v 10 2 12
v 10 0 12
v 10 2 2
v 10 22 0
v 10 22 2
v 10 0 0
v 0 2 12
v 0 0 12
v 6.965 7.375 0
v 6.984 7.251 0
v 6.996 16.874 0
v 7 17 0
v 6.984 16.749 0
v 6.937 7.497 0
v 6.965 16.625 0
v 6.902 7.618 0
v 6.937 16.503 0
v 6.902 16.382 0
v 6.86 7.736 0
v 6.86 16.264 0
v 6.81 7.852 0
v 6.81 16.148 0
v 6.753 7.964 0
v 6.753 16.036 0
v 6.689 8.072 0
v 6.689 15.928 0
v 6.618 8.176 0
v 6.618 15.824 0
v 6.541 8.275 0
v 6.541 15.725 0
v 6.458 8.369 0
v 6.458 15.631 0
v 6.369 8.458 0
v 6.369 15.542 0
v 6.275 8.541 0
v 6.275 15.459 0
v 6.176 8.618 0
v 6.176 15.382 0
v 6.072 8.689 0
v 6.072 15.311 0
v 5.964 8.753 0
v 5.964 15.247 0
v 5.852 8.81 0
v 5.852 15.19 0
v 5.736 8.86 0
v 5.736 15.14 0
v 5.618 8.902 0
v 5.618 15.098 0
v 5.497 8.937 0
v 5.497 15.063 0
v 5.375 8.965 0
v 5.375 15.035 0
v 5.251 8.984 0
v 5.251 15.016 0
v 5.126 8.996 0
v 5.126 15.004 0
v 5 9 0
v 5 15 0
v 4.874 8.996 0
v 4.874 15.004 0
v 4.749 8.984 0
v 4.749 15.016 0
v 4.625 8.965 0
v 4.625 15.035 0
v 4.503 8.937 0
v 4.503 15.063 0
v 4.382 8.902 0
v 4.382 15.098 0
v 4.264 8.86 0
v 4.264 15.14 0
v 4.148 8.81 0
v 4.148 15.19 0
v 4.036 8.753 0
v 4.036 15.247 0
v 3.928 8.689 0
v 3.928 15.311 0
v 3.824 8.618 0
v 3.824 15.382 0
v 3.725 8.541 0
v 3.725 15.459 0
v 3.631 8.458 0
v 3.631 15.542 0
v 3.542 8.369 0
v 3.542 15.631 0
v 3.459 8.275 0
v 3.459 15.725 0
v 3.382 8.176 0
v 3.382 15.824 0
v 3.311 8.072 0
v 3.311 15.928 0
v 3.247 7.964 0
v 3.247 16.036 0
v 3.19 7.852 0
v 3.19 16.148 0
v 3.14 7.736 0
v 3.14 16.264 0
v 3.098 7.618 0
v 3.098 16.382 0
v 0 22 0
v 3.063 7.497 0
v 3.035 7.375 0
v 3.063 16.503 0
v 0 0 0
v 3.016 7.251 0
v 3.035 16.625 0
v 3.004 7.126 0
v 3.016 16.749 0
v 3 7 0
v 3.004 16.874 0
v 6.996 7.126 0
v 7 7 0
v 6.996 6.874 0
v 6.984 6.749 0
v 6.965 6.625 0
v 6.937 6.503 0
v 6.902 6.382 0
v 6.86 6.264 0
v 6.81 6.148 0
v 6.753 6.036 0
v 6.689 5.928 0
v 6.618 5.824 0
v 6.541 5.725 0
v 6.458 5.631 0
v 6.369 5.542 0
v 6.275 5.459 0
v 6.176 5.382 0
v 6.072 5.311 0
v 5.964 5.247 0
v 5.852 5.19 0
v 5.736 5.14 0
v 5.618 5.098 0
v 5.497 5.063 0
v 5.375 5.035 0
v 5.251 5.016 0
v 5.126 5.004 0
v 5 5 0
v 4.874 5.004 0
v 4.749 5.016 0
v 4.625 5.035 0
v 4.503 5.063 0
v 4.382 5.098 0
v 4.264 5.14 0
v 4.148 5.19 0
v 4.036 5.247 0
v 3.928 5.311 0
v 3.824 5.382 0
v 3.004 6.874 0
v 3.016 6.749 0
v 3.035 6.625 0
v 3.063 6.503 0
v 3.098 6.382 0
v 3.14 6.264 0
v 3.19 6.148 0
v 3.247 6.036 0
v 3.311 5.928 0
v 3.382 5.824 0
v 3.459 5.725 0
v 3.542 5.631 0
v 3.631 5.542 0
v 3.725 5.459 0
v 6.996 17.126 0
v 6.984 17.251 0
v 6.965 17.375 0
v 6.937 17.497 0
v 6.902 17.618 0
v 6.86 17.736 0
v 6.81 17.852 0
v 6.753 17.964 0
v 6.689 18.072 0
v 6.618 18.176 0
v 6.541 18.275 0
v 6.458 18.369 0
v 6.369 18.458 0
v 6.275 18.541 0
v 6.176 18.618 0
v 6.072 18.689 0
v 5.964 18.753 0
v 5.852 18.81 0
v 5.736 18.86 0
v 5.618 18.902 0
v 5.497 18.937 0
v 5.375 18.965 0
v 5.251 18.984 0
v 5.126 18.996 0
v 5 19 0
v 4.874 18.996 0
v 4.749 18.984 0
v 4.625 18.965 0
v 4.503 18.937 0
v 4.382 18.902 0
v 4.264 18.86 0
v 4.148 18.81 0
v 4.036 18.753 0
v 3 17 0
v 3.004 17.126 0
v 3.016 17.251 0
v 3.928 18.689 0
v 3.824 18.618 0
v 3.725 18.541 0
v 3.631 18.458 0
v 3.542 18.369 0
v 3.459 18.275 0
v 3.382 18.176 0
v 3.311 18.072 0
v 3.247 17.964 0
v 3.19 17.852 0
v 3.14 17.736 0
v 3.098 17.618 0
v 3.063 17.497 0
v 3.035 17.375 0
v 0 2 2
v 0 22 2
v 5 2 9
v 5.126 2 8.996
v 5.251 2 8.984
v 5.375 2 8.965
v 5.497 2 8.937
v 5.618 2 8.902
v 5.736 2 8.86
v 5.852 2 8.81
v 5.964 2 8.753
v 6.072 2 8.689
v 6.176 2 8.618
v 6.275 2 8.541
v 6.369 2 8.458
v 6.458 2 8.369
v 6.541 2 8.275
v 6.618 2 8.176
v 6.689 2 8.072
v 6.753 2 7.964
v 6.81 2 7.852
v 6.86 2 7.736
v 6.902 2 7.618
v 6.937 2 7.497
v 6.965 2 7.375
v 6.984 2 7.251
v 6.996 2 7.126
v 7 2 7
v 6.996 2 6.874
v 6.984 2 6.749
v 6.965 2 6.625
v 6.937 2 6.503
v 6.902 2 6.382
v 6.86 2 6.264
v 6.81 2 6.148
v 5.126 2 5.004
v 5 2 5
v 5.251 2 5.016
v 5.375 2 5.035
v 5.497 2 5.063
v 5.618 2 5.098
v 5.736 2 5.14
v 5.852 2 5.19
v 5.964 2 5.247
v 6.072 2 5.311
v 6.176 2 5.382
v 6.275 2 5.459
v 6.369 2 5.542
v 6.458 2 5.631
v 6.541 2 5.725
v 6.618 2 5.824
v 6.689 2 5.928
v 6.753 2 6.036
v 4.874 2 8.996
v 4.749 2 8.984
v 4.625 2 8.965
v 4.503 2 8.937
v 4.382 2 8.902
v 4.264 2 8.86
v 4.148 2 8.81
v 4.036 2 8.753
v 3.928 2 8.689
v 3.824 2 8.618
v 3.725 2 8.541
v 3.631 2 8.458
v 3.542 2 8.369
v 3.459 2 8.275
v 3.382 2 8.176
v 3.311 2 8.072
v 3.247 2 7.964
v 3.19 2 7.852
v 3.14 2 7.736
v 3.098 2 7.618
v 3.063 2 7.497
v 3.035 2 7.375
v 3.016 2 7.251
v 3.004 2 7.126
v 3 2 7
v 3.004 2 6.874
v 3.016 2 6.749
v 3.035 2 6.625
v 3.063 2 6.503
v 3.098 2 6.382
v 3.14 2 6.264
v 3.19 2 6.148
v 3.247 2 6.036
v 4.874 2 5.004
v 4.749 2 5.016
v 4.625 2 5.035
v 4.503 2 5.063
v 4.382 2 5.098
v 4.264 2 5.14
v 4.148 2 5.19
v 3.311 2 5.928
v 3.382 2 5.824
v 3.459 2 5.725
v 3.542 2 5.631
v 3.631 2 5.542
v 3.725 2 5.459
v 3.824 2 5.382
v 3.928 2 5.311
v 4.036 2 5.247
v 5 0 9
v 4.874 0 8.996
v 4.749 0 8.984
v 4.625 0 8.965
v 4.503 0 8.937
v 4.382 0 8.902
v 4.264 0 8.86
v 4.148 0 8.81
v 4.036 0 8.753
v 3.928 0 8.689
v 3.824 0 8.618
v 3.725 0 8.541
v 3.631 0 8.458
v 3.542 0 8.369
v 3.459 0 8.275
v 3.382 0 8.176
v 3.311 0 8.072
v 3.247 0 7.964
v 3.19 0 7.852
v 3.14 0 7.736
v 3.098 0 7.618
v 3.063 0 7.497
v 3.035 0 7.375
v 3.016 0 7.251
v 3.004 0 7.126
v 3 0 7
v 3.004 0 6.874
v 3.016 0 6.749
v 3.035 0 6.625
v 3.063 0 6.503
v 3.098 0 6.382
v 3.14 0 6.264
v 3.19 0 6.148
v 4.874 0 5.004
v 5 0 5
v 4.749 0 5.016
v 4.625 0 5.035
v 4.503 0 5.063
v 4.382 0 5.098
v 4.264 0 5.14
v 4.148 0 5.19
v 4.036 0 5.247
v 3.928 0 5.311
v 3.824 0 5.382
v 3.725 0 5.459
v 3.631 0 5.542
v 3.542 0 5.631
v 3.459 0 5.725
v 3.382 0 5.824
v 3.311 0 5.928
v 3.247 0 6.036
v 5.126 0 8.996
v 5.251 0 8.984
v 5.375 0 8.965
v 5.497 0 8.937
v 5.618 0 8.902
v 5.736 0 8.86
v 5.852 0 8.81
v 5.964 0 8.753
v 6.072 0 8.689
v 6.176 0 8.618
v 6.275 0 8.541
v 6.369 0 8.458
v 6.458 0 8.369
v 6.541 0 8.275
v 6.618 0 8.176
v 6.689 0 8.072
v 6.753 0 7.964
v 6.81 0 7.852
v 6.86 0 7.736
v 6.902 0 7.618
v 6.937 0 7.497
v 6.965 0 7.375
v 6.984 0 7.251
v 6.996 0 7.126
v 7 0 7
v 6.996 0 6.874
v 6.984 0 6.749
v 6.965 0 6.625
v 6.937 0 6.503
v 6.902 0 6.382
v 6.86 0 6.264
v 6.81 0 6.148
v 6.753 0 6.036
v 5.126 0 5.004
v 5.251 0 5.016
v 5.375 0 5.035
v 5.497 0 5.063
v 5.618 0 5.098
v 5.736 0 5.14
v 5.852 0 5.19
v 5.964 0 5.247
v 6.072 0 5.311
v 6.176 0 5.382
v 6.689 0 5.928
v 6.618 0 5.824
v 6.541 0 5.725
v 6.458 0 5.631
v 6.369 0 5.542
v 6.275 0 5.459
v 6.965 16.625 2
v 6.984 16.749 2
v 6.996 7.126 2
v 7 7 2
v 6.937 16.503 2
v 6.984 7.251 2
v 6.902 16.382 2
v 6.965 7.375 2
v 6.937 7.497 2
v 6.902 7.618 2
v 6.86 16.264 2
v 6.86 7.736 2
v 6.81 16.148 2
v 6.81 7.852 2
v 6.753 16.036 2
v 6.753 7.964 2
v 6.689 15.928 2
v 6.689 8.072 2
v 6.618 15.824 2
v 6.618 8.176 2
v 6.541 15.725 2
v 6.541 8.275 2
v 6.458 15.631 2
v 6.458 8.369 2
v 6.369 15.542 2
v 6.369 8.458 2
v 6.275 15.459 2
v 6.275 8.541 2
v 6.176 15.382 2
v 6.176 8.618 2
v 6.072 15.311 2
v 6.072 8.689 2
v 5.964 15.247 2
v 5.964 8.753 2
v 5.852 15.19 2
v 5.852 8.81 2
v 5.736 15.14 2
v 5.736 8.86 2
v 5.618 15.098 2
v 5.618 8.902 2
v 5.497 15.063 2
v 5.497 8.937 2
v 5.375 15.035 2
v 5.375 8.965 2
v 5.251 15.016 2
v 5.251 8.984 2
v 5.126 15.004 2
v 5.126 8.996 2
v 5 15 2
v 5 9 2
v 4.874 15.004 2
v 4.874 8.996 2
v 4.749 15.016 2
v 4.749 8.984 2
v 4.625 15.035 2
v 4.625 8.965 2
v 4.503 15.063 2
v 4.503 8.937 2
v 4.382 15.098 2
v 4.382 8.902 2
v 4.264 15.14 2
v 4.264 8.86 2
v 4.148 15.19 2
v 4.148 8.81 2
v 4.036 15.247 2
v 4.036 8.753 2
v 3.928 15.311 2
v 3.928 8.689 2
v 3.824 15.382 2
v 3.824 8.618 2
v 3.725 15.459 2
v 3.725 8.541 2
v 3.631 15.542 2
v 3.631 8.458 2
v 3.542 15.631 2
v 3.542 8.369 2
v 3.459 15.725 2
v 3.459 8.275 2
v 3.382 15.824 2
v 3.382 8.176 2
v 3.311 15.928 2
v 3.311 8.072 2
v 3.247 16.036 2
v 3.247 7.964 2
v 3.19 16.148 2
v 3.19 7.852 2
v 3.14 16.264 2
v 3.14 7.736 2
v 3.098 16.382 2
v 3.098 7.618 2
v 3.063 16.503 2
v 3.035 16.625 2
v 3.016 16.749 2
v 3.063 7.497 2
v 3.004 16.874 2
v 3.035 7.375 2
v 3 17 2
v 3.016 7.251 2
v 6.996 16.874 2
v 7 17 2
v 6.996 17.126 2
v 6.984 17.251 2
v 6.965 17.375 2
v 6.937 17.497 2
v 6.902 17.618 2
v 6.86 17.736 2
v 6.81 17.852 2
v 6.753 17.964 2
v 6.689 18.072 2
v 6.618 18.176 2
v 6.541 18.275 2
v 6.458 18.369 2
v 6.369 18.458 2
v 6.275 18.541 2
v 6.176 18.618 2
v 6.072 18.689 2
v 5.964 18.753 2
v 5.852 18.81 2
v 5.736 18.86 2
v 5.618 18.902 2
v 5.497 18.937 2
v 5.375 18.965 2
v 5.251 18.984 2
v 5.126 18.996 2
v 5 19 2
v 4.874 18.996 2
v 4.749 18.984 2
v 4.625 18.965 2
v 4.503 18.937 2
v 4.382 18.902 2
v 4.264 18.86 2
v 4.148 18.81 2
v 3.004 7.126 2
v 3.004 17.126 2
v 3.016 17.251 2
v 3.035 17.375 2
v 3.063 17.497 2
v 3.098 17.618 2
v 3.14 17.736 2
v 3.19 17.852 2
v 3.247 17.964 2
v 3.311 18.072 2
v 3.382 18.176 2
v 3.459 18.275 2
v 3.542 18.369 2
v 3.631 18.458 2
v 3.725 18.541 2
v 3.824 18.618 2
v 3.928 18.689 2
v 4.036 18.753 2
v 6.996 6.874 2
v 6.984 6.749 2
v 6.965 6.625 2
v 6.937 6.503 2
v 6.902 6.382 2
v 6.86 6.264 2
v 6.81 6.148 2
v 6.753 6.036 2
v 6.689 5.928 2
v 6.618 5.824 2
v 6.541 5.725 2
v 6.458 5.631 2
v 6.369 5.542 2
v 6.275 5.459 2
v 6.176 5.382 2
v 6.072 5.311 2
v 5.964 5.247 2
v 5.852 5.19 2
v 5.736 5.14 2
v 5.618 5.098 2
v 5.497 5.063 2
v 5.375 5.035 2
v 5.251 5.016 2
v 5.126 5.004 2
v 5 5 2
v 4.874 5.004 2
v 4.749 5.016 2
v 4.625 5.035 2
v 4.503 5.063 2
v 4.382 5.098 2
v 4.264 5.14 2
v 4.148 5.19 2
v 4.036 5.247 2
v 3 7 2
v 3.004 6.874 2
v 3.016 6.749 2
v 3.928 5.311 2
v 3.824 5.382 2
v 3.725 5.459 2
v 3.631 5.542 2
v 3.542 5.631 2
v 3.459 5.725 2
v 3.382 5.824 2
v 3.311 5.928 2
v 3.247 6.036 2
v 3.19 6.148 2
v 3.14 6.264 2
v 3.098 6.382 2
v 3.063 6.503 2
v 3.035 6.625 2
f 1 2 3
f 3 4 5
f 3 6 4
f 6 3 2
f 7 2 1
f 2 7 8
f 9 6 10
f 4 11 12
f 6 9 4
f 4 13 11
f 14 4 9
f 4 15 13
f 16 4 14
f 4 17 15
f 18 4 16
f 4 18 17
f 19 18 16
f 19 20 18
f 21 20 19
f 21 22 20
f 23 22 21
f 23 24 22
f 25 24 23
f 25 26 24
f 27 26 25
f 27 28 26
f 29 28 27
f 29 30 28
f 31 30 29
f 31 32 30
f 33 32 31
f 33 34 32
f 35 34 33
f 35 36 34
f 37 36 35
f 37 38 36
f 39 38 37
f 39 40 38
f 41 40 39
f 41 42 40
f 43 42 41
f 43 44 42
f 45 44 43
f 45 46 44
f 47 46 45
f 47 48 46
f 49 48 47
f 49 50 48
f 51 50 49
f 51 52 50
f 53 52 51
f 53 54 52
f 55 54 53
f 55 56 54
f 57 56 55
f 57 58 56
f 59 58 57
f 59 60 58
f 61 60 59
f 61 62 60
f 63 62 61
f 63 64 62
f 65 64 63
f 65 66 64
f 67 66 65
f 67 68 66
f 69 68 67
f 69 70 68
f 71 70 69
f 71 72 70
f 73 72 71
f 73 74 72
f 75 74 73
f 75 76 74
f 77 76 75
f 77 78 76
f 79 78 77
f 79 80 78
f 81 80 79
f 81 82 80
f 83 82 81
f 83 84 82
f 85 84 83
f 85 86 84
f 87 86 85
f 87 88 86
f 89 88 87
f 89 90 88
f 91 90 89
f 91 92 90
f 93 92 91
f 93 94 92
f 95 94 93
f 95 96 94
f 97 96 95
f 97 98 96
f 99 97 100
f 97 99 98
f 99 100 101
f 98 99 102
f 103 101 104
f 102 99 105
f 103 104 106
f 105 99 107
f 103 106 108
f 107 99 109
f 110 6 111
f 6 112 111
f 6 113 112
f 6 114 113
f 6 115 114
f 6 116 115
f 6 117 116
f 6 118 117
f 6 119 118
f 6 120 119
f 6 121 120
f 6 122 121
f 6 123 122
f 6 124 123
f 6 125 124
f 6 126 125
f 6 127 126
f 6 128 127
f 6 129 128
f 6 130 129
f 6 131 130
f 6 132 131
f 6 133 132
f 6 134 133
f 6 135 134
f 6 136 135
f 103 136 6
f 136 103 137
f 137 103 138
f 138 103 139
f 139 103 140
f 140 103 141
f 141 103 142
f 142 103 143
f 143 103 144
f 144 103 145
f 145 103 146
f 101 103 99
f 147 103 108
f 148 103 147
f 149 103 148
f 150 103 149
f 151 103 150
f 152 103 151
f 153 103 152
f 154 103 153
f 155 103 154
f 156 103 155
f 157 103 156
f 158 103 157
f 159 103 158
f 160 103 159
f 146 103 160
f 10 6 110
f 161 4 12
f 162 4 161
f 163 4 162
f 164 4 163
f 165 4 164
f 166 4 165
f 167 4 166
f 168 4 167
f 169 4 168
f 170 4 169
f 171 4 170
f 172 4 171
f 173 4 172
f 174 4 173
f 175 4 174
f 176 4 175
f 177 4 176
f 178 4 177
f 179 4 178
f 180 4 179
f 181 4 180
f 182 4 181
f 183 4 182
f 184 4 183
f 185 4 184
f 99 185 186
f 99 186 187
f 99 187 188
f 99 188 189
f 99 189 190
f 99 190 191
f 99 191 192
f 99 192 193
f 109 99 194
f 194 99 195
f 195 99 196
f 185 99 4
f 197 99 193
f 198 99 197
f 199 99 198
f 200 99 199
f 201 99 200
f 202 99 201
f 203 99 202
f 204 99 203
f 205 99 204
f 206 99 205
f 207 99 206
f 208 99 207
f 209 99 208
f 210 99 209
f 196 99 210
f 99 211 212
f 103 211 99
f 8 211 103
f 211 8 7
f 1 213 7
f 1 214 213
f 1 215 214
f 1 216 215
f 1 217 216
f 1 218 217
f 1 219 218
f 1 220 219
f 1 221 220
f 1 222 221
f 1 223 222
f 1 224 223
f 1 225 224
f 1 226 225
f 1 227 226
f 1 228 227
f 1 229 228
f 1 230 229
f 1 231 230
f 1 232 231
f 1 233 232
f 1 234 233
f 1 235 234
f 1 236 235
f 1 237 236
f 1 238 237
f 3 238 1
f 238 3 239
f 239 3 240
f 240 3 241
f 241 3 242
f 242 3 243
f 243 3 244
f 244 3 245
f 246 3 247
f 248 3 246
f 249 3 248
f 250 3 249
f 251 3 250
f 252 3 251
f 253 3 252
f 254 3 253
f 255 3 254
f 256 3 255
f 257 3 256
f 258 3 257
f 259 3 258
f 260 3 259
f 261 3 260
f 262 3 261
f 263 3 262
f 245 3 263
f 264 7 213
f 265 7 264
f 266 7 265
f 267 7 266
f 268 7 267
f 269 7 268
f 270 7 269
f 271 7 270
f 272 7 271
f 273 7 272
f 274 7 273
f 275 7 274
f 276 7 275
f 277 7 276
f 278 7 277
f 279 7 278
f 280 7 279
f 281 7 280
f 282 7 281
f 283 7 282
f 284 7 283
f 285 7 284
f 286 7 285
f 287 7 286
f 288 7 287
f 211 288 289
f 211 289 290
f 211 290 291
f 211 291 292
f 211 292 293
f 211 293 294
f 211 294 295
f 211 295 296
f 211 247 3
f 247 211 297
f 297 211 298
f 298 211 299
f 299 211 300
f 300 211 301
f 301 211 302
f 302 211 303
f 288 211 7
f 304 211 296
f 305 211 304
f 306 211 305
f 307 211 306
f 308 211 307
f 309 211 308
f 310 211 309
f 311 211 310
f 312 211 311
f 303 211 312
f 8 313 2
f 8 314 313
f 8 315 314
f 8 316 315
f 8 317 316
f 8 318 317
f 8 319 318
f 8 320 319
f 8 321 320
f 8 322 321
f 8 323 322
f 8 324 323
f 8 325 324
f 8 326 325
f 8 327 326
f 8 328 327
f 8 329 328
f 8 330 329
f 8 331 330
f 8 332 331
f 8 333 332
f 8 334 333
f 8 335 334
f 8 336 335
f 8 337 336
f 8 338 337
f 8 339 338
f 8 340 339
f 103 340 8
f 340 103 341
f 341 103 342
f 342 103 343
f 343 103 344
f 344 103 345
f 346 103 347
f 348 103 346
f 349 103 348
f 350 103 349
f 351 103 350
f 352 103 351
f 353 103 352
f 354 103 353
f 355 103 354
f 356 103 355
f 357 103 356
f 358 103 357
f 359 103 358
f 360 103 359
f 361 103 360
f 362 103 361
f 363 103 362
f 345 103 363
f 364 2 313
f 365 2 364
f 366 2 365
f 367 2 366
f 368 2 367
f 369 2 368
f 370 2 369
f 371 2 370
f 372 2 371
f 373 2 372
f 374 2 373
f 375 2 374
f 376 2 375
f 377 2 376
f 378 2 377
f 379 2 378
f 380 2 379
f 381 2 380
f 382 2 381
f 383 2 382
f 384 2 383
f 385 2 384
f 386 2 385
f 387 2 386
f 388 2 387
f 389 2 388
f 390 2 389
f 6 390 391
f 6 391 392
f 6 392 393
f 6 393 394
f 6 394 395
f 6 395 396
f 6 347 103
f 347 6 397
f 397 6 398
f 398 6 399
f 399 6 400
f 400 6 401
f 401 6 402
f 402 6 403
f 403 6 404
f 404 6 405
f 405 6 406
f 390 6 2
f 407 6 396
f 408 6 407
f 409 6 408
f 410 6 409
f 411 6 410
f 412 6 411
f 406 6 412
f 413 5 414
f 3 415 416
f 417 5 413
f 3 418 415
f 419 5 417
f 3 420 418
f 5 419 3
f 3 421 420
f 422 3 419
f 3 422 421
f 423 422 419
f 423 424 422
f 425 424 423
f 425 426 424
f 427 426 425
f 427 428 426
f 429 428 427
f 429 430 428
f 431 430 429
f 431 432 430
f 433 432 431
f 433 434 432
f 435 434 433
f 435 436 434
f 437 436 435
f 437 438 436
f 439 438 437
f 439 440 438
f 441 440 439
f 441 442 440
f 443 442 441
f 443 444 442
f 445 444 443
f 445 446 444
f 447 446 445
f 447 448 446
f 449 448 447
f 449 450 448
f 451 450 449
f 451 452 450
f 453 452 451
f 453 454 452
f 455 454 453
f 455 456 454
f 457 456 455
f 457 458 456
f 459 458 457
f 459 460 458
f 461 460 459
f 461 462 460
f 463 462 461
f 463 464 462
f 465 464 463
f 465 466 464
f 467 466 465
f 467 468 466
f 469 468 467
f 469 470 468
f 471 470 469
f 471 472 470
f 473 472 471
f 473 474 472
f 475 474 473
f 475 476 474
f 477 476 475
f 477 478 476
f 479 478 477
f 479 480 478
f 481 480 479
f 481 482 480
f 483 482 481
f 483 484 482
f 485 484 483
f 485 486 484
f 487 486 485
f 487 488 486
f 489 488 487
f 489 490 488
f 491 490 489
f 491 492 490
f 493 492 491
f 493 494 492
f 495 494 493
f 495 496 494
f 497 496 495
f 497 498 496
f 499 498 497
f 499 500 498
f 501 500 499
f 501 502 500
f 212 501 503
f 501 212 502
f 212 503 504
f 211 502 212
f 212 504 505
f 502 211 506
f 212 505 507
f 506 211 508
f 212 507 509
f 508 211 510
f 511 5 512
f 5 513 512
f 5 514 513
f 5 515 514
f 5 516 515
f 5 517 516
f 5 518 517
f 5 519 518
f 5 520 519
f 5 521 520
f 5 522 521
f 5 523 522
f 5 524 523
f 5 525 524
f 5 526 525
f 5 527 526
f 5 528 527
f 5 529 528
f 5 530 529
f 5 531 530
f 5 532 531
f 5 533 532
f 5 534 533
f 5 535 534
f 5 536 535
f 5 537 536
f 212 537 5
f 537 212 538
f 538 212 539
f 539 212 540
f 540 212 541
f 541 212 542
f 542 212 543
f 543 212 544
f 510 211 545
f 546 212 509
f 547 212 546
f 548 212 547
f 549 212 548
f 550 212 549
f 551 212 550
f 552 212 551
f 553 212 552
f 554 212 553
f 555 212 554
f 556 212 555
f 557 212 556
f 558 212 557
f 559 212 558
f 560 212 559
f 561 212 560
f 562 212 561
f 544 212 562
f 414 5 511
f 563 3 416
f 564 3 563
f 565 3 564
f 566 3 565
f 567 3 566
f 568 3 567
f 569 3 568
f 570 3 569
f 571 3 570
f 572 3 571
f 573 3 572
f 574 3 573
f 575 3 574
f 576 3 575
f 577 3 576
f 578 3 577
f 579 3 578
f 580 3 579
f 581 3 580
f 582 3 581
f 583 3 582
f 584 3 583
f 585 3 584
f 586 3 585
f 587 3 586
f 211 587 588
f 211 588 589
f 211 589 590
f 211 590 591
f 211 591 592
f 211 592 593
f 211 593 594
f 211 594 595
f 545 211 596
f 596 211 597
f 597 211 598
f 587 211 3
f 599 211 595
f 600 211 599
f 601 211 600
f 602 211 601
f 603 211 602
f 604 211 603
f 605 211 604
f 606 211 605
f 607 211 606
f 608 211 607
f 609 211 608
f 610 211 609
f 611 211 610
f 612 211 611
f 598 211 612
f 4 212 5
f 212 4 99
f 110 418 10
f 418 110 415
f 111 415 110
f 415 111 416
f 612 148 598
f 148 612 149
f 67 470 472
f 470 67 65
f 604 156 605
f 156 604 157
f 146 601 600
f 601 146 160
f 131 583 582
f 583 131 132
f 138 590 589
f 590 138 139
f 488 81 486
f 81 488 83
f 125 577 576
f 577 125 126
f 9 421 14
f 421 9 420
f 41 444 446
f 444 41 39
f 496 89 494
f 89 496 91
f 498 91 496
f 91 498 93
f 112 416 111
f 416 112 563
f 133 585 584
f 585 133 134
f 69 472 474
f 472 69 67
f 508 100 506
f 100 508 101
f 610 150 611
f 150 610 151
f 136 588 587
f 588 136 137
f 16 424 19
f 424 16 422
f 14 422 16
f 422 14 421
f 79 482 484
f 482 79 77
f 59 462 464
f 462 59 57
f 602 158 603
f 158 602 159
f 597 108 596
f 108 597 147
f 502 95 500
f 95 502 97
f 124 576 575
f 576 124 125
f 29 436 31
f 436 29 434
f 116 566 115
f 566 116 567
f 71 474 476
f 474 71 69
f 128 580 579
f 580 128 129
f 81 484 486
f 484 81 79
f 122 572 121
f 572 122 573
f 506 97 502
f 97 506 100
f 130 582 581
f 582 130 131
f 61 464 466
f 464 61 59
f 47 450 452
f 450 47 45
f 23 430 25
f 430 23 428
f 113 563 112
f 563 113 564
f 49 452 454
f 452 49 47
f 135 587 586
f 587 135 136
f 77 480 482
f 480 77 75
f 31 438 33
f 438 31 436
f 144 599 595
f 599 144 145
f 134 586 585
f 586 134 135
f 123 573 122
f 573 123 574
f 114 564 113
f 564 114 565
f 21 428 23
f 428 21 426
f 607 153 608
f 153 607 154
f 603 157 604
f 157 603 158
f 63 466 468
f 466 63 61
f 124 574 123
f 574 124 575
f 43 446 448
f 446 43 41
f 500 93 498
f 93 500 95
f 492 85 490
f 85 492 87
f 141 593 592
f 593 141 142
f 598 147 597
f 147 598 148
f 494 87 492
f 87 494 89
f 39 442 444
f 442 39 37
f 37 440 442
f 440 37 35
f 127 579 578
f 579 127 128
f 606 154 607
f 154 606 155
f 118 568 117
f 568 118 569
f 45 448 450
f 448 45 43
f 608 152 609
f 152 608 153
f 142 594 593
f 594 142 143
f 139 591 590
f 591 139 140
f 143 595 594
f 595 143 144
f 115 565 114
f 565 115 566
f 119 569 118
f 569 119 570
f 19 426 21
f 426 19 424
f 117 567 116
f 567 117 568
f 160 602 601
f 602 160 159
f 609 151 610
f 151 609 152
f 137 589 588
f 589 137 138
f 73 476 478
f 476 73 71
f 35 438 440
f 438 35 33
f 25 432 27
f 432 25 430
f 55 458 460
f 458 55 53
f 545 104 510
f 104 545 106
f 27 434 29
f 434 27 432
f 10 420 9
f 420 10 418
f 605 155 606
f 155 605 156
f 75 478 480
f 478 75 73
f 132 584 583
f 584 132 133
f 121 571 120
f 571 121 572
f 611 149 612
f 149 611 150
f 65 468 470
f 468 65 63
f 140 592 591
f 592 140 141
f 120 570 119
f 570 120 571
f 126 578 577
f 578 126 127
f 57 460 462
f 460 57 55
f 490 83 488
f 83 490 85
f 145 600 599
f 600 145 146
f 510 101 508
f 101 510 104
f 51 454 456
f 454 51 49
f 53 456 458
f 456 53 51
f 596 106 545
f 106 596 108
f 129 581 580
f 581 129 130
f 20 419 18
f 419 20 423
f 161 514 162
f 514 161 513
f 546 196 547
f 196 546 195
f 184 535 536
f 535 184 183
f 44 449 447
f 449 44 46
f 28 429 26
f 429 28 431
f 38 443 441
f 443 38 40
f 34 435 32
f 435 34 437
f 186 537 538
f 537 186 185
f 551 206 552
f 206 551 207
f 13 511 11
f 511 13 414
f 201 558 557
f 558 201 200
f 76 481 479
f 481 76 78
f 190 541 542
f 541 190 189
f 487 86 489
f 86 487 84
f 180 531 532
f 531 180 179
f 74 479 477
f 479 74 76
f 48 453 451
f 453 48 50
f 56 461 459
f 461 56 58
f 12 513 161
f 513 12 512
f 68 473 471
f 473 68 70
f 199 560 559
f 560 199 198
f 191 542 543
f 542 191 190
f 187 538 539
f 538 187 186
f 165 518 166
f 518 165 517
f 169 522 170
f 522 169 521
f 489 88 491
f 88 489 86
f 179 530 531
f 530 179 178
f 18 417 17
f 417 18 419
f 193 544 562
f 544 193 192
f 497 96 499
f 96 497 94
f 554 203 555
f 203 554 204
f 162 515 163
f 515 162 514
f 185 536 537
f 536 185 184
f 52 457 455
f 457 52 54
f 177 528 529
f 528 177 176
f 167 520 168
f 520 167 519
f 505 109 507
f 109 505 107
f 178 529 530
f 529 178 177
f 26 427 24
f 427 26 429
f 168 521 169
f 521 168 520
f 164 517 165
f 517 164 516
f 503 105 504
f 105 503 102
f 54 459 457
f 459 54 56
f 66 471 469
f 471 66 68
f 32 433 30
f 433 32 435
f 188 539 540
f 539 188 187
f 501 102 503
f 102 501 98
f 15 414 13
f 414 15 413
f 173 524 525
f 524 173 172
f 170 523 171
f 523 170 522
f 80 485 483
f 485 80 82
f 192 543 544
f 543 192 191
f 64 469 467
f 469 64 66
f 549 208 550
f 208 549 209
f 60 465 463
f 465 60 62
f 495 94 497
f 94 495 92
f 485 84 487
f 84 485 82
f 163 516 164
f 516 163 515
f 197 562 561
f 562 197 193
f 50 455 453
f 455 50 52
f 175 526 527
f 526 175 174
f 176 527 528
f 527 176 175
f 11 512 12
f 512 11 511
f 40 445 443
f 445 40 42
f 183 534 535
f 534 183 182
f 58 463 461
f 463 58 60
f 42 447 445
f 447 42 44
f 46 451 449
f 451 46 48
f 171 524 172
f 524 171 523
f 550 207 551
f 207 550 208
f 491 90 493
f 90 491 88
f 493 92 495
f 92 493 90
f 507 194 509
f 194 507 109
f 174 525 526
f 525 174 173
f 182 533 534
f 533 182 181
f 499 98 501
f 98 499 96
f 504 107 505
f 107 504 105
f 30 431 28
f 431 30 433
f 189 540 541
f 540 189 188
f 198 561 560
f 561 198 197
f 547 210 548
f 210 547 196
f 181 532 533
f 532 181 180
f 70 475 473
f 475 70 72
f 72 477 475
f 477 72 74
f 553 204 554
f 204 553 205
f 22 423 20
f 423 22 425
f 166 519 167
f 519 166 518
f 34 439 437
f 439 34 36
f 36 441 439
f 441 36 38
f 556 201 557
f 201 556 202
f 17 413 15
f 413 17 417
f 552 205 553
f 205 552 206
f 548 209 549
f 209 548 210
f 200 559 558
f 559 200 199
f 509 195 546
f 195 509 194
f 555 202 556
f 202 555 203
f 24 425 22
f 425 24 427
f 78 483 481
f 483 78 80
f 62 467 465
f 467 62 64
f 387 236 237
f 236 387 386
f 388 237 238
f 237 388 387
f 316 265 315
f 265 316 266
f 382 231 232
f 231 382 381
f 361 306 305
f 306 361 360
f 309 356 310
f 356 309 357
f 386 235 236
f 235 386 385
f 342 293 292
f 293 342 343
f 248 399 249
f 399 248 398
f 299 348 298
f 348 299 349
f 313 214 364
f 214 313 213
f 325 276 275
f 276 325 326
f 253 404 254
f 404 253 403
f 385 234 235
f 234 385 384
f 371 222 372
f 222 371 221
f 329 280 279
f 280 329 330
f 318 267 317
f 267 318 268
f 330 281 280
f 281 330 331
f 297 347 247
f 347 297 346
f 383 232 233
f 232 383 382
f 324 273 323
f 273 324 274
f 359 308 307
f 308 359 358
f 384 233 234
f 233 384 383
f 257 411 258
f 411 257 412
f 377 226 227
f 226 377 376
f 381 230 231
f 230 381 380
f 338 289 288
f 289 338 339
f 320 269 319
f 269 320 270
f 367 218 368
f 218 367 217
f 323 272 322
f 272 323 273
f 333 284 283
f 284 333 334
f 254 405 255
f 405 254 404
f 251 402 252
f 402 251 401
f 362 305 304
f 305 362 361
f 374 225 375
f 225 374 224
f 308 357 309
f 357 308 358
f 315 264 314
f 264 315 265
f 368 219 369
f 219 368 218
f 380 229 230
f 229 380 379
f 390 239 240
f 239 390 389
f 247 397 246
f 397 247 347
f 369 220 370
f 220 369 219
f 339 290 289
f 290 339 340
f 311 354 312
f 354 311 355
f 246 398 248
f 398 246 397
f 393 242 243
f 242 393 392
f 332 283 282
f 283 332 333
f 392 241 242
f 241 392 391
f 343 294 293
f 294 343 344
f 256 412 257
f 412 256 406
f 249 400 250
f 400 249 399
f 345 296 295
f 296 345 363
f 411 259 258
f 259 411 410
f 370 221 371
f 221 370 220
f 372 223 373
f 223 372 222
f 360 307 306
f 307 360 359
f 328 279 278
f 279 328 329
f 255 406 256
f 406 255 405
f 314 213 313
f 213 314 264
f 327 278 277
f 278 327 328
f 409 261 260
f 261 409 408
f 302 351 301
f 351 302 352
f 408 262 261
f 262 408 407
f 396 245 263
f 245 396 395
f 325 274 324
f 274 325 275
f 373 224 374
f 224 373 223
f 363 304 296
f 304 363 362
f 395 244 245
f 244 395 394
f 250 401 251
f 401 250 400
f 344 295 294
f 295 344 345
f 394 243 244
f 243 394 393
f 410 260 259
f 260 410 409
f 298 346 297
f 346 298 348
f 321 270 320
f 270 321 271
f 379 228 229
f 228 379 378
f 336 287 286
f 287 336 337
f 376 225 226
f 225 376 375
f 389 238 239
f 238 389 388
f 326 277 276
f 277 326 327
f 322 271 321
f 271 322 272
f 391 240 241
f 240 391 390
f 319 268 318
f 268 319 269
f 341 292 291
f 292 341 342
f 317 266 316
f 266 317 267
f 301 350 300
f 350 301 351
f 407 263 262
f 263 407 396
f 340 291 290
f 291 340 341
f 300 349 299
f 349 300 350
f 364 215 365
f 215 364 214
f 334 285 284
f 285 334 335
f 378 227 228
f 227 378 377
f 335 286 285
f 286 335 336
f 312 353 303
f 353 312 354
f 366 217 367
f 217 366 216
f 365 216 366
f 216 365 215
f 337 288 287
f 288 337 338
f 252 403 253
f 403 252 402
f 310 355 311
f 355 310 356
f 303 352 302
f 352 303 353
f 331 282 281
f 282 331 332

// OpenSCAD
//angle1(1);
angle1(2);
//angle1(3);

module angle1(holes=1) {
  // отверстие=4мм
  // расстояние между отверстиями=6мм
  // расстояние от отверстия до края=3мм
  // толщина стенки=2мм

  difference() {
    union() {
      // в высоту по Z
      cube([3+4+3, 2, 2+3+4+3]);
      // в длину по Y
      cube([3+4+3, 2+(6+4)*holes, 2]);
    }
    // дырки по Z
    translate([5, 3, 2+3+2]) rotate ([90, 0, 0]) cylinder(h=4, r=2, $fn=100);

    // дырки по Y
    for(hole=[1 : holes]) {
      translate([5, 2-3+(6+4)*hole-2, -1]) cylinder(h=4, r=2, $fn=100);
    }   
  }
}
